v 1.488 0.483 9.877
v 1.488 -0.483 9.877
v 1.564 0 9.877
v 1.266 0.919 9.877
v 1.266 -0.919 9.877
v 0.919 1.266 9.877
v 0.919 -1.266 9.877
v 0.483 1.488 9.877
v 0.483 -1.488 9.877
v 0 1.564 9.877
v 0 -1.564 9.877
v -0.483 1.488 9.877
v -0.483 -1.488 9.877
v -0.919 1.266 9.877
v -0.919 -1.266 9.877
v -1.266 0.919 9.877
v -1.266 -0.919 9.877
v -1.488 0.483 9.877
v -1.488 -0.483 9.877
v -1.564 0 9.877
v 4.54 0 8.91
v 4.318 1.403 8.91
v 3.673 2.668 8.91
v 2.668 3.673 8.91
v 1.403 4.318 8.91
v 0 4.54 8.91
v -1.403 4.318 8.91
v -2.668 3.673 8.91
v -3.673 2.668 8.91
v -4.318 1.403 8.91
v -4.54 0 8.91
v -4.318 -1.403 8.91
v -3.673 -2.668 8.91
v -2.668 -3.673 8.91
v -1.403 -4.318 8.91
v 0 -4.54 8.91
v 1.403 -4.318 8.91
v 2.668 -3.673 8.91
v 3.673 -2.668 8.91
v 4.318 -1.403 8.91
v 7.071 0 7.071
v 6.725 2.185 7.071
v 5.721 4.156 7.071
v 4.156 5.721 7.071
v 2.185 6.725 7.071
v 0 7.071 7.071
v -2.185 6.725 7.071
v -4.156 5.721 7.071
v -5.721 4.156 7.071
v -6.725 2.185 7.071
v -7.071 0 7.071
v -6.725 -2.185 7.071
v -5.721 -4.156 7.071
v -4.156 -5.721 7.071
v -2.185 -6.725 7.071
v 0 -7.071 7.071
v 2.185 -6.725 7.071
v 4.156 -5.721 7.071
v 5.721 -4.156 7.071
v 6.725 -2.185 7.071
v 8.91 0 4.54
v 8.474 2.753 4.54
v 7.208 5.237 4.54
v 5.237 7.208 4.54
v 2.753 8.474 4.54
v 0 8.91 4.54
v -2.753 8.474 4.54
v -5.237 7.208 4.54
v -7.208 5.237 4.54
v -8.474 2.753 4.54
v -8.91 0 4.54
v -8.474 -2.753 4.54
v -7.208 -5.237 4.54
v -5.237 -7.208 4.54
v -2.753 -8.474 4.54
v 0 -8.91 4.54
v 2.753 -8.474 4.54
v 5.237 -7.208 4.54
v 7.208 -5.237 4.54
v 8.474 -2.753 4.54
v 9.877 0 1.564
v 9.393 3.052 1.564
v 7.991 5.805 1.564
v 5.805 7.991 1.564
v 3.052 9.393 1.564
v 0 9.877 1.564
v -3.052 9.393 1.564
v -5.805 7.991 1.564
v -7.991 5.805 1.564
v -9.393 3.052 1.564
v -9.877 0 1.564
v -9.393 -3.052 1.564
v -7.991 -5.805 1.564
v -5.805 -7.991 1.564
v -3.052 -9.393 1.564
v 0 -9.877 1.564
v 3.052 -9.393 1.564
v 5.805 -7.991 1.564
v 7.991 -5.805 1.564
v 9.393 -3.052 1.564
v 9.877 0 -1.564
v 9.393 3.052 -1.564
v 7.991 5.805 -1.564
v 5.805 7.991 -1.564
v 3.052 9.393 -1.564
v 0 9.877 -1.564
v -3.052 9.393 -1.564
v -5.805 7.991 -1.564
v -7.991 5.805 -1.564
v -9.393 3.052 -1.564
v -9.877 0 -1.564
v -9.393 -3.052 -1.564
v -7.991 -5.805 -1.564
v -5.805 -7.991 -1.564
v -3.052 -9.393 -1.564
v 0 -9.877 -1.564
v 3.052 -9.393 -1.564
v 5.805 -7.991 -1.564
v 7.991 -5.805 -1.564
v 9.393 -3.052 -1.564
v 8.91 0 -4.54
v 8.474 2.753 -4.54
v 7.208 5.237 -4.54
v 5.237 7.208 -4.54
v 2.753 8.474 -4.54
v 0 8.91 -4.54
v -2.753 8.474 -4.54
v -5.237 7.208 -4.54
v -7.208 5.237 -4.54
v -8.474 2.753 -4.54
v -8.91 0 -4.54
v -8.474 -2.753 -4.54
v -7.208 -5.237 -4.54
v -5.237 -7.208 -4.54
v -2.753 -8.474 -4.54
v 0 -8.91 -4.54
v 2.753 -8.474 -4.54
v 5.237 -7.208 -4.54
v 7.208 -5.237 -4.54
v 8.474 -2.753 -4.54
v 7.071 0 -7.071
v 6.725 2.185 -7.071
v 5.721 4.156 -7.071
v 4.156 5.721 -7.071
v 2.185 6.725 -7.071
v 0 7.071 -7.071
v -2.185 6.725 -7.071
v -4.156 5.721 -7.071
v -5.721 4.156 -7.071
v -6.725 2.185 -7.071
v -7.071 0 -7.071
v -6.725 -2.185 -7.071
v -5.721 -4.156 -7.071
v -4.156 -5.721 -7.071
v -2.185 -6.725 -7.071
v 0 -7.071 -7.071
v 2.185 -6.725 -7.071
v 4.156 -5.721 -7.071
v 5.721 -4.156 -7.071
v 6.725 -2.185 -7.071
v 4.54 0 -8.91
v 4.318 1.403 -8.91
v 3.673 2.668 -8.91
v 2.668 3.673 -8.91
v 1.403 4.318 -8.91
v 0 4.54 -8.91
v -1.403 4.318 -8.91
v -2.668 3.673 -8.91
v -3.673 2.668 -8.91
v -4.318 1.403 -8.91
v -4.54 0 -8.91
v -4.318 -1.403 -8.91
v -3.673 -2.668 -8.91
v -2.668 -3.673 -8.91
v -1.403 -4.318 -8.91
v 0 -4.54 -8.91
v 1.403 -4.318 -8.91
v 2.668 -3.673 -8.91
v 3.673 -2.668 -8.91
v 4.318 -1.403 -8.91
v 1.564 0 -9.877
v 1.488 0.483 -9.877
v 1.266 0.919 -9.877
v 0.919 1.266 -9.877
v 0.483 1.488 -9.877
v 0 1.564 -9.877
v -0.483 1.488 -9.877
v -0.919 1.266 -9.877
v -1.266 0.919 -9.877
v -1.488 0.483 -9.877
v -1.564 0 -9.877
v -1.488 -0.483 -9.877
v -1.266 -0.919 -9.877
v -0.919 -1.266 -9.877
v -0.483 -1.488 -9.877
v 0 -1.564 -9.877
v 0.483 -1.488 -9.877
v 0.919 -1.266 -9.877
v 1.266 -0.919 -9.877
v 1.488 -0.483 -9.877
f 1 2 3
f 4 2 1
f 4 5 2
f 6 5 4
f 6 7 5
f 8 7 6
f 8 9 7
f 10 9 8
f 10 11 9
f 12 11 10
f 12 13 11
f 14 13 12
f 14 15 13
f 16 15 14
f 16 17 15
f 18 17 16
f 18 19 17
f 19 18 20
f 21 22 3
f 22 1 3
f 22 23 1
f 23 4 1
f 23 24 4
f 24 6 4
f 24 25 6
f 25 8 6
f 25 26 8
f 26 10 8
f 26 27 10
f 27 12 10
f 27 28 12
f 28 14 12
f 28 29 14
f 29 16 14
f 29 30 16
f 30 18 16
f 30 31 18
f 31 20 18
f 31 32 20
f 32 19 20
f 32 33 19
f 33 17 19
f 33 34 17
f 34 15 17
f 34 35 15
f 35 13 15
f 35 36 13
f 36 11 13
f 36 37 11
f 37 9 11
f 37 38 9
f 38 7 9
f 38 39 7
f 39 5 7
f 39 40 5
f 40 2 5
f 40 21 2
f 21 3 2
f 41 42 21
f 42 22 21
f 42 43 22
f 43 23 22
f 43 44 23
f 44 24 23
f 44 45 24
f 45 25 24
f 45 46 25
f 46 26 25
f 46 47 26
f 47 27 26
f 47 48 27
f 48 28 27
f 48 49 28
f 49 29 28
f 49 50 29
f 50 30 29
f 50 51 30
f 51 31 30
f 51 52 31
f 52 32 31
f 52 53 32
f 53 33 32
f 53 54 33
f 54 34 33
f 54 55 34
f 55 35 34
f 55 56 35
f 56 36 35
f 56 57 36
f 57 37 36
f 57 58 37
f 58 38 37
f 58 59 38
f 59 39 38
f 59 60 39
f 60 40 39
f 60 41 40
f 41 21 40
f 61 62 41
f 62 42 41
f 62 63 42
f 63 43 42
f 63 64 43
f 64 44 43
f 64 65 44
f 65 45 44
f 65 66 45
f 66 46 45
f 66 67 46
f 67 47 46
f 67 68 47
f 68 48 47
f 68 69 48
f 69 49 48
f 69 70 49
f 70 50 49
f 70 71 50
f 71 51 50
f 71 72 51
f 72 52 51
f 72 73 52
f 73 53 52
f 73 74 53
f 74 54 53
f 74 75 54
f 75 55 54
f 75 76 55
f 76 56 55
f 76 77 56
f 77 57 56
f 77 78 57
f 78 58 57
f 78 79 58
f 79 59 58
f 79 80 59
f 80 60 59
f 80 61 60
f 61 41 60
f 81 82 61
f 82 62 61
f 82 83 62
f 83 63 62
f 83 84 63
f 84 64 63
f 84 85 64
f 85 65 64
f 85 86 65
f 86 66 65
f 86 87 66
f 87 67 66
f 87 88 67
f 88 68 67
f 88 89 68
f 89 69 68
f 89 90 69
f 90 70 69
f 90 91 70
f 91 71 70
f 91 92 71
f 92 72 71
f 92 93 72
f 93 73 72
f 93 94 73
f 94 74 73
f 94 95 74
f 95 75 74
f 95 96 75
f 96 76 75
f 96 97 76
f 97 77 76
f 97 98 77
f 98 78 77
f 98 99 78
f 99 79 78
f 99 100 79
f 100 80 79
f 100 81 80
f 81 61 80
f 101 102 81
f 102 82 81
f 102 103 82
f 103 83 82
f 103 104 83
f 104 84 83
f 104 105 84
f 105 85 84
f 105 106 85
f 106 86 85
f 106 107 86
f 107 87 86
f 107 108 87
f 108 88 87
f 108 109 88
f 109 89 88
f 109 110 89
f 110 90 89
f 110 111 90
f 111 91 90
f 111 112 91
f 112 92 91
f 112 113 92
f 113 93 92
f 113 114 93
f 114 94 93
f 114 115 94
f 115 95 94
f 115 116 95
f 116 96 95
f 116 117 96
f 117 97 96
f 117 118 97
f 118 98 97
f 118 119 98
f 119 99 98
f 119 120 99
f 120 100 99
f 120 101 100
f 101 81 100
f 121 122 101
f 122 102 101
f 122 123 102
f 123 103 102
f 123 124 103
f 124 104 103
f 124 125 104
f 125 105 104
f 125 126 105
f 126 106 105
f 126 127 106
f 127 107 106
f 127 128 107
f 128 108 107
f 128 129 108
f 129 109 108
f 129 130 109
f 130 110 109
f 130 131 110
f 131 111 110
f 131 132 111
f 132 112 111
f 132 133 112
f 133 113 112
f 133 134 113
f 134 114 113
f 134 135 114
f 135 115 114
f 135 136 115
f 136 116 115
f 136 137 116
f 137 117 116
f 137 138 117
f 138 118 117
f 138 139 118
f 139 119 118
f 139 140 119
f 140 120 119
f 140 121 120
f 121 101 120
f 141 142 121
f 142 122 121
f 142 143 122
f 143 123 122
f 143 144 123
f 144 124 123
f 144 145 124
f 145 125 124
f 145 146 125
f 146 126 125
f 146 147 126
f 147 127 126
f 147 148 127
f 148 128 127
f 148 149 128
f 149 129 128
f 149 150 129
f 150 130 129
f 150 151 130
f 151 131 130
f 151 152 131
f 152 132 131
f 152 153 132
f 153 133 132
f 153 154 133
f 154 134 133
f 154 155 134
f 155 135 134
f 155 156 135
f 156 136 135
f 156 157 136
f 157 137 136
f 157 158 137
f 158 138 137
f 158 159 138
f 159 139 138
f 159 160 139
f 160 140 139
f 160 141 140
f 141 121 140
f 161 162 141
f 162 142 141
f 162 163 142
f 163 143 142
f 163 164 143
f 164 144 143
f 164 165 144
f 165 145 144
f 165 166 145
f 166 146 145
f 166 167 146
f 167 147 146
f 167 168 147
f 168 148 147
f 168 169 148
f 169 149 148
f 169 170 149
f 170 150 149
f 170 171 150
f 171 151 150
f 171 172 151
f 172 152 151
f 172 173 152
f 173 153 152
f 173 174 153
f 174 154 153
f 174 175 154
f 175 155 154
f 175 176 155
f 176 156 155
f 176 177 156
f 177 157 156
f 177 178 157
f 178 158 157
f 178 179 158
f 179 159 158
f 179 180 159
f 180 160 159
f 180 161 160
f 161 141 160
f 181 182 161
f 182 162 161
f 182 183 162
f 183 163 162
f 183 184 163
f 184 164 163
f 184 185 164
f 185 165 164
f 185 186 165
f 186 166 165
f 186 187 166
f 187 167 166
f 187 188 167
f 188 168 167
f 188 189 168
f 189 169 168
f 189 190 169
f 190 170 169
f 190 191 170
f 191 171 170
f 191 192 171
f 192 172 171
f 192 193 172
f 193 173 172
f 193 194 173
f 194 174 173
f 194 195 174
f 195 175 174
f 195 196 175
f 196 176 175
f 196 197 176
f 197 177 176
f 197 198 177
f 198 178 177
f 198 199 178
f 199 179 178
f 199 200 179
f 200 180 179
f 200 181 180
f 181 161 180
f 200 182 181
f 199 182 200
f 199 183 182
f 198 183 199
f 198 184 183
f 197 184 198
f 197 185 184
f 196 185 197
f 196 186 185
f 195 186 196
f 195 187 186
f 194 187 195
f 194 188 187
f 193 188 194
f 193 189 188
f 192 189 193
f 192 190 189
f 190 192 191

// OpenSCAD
// Kugel r=10mm
!sphere(10, $fn=20);
// Kugel r=10mm, 8 Ecken
sphere(10, $fn=8);
// Kugel r=10mm, 100 Ecken
sphere(10, $fn=100) 
// Kugel r=10mm rotiert um 45° x-Achse
rotate([45,0,0]) sphere(10);
